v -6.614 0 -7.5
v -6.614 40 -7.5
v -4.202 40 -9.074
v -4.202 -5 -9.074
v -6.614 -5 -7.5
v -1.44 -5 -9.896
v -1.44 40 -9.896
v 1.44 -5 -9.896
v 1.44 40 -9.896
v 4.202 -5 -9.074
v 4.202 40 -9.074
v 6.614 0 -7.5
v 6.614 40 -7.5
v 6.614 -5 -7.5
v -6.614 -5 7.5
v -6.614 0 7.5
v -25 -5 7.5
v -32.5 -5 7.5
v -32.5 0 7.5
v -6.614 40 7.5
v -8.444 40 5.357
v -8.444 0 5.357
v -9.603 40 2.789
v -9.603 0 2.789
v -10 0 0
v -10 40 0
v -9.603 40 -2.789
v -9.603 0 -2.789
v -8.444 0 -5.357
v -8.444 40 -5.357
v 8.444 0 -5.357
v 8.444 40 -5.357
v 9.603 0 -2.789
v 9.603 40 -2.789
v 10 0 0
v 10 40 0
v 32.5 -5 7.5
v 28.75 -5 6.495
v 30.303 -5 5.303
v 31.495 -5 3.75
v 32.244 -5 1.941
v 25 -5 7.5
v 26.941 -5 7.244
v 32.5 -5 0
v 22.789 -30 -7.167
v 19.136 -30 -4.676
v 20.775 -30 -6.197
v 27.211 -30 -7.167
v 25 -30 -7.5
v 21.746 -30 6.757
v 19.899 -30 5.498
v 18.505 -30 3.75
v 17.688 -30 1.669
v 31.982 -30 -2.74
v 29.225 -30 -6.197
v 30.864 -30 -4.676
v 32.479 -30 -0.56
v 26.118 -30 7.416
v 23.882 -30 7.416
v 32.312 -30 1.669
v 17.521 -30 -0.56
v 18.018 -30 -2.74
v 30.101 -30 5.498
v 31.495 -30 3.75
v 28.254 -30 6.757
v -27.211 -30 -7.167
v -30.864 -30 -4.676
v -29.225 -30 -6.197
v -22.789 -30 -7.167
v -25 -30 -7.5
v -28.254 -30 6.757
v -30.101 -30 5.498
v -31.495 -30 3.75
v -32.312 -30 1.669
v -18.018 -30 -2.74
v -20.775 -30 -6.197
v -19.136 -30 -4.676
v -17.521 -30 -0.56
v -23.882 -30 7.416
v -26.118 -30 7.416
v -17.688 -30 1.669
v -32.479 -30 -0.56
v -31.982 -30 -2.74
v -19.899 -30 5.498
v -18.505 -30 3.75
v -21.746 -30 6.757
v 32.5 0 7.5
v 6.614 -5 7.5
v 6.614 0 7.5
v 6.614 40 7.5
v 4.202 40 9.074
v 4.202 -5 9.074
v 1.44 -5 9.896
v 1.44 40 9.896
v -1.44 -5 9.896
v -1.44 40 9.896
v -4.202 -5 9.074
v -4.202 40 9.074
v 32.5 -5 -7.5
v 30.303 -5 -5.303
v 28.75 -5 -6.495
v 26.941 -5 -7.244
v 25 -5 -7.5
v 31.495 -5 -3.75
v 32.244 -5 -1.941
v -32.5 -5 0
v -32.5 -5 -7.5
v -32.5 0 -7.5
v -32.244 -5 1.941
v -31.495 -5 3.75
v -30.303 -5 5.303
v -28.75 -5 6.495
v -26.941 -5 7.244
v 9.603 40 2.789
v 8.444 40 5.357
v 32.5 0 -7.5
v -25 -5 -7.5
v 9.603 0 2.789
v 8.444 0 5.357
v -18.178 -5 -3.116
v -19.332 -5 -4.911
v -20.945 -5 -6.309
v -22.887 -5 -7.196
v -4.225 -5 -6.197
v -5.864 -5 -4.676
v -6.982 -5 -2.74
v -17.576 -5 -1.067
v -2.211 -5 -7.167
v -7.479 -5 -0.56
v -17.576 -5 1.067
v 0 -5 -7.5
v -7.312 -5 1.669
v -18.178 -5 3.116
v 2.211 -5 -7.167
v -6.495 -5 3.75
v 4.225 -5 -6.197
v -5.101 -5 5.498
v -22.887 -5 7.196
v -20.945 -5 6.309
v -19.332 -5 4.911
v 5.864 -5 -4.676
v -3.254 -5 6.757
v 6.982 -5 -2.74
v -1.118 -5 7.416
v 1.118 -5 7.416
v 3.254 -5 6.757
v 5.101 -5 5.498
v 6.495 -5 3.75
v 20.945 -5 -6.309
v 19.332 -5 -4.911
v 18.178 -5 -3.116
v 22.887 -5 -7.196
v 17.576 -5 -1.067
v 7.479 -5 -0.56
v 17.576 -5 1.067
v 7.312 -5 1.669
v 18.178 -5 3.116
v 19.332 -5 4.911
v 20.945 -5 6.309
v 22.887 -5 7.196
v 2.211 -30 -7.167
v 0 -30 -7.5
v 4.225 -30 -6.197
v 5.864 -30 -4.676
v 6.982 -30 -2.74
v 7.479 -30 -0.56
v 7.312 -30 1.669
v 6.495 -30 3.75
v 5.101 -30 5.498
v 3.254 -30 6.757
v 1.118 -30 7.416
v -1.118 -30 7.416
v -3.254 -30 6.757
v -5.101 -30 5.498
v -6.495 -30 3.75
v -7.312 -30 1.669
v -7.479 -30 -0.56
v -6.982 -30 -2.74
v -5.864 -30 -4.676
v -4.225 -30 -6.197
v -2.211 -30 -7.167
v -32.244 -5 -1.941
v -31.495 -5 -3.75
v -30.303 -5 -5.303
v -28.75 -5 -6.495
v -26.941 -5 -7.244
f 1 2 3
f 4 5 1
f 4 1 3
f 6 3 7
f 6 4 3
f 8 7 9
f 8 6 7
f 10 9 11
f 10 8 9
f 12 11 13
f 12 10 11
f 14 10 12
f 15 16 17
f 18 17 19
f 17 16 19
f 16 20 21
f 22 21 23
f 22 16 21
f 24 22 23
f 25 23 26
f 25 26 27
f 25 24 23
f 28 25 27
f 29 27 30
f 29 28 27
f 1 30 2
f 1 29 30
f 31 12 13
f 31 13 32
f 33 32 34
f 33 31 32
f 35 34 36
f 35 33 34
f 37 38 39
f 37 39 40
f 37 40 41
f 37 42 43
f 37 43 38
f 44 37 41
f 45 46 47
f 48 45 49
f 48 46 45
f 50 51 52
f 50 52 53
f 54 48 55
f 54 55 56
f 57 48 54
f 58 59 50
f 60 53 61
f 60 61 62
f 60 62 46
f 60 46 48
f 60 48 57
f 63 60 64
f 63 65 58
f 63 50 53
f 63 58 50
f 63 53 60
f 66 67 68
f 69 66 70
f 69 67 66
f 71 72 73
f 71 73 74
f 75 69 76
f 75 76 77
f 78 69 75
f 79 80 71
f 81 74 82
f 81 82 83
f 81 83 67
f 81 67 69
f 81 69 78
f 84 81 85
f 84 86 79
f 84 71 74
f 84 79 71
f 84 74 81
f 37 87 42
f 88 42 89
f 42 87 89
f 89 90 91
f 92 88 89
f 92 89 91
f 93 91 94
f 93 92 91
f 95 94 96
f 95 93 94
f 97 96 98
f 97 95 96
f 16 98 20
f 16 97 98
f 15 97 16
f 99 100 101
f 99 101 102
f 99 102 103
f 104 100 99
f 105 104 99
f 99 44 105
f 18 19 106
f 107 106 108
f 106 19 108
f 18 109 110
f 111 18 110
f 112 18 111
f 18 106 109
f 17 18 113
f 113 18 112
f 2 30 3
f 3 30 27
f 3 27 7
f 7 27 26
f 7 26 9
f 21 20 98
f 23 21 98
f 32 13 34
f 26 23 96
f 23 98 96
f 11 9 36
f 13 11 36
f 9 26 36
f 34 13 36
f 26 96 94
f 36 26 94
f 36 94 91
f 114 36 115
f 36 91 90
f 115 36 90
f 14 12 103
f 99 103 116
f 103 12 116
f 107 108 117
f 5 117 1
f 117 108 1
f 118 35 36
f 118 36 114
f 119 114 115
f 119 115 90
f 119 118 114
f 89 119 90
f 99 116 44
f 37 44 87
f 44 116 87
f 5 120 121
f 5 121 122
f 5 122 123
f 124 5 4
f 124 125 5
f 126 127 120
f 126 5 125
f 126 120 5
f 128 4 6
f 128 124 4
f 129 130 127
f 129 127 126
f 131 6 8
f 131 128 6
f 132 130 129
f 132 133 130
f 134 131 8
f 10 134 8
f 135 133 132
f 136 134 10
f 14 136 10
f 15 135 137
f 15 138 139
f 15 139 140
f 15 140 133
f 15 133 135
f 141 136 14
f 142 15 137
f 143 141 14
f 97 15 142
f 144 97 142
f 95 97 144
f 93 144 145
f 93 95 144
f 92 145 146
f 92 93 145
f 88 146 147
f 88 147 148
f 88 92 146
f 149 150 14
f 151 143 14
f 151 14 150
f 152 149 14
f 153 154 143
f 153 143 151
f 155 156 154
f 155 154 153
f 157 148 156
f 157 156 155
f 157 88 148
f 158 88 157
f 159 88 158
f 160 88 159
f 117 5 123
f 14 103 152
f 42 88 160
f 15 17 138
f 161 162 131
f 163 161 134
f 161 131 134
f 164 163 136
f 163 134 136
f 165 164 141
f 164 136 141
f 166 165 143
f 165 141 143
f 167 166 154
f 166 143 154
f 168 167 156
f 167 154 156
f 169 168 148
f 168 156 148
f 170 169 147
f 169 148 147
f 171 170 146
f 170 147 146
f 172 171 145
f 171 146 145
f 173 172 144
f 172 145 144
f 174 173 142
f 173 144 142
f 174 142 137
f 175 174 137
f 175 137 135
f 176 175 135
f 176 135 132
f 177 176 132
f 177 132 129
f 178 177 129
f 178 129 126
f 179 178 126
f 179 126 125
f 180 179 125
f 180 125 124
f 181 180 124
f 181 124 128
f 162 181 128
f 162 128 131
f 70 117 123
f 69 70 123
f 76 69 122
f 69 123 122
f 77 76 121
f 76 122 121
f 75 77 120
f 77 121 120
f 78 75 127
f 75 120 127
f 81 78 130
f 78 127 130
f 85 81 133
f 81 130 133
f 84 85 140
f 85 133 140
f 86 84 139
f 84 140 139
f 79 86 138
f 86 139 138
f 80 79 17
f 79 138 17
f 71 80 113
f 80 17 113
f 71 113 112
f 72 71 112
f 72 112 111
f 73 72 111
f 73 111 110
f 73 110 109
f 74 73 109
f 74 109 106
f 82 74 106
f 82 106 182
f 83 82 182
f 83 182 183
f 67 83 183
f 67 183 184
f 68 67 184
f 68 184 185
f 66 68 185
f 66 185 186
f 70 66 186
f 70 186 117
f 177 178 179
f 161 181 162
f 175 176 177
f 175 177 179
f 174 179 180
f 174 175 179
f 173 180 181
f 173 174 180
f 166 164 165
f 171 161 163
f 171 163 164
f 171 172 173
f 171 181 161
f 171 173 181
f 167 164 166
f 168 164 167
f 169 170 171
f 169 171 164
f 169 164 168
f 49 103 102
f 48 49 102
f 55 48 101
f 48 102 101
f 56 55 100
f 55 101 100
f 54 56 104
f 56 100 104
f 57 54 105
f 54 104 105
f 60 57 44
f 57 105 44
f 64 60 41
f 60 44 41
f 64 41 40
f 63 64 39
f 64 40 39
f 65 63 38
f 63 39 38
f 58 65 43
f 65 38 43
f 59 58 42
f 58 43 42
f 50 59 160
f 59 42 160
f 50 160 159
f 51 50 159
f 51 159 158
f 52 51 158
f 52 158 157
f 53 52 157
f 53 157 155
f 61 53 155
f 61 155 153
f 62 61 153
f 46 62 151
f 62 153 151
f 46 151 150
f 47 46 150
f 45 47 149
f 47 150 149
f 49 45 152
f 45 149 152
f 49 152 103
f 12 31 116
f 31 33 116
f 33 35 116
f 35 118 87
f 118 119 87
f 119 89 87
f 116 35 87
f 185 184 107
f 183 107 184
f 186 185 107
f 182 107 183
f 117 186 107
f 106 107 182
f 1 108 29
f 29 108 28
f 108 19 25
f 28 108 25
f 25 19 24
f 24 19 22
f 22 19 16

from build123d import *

# Parameters (mm, degrees)
F1_DEPTH = 5
F2_DEPTH = 30
F3_DEPTH = 40


# Not quite as in the source:
# - after a boolean that leaves OpenCascade's solid faulty, fix() repairs it


with BuildPart() as f1:
    # F0 (on Front) → F1 (new body)
    with BuildSketch(Plane.XZ):
        with BuildLine():
            Line((-25, 7.5), (-32.5, 7.5))
            Line((-32.5, 7.5), (-32.5, 0))
            ThreePointArc((-32.5, 0), (-30.3033008589, 5.3033008589), (-25, 7.5))
        make_face()
        with BuildLine():
            Line((-6.6143782777, 7.5), (-25, 7.5))
            ThreePointArc((-25, 7.5), (-19.6966991411, 5.3033008589), (-17.5, 0))
            ThreePointArc((-17.5, 0), (-19.6966991411, -5.3033008589), (-25, -7.5))
            Line((-25, -7.5), (-6.6143782777, -7.5))
            ThreePointArc((-6.6143782777, -7.5), (-10, 0), (-6.6143782777, 7.5))
        make_face()
        with BuildLine():
            ThreePointArc((-17.5, 0), (-19.6966991411, 5.3033008589), (-25, 7.5))
            ThreePointArc((-25, 7.5), (-30.3033008589, 5.3033008589), (-32.5, 0))
            ThreePointArc((-32.5, 0), (-30.3033008589, -5.3033008589), (-25, -7.5))
            ThreePointArc((-25, -7.5), (-19.6966991411, -5.3033008589), (-17.5, 0))
        make_face()
        with BuildLine():
            ThreePointArc((-25, -7.5), (-30.3033008589, -5.3033008589), (-32.5, 0))
            Line((-32.5, 0), (-32.5, -7.5))
            Line((-32.5, -7.5), (-25, -7.5))
        make_face()
        with BuildLine():
            ThreePointArc((6.6143782777, 7.5), (0, 10), (-6.6143782777, 7.5))
            Line((-6.6143782777, 7.5), (0, 7.5))
            Line((0, 7.5), (6.6143782777, 7.5))
        make_face()
        with BuildLine():
            Line((0, 7.5), (-6.6143782777, 7.5))
            ThreePointArc((-6.6143782777, 7.5), (-10, 0), (-6.6143782777, -7.5))
            Line((-6.6143782777, -7.5), (-2.86e-08, -7.5))
            ThreePointArc((-2.86e-08, -7.5), (-7.5, 1.43e-08), (0, 7.5))
        make_face()
        with BuildLine():
            Line((6.6143782777, 7.5), (0, 7.5))
            ThreePointArc((0, 7.5), (5.3033008589, 5.3033008589), (7.5, 0))
            ThreePointArc((7.5, 0), (5.3033008488, -5.303300869), (-2.86e-08, -7.5))
            Line((-2.86e-08, -7.5), (6.6143782777, -7.5))
            ThreePointArc((6.6143782777, -7.5), (9.1143782777, -4.1143782777), (10, 0))
            ThreePointArc((10, 0), (9.1143782777, 4.1143782777), (6.6143782777, 7.5))
        make_face()
        with BuildLine():
            Line((25, 7.5), (6.6143782777, 7.5))
            ThreePointArc((6.6143782777, 7.5), (9.1143782777, 4.1143782777), (10, 0))
            ThreePointArc((10, 0), (9.1143782777, -4.1143782777), (6.6143782777, -7.5))
            Line((6.6143782777, -7.5), (25, -7.5))
            ThreePointArc((25, -7.5), (17.5, 0), (25, 7.5))
        make_face()
        with BuildLine():
            Line((-2.86e-08, -7.5), (-6.6143782777, -7.5))
            ThreePointArc((-6.6143782777, -7.5), (0, -10), (6.6143782777, -7.5))
            Line((6.6143782777, -7.5), (-2.86e-08, -7.5))
        make_face()
        with BuildLine():
            Line((32.5, 7.5), (25, 7.5))
            ThreePointArc((25, 7.5), (30.3033008589, 5.3033008589), (32.5, 0))
            Line((32.5, 0), (32.5, 7.5))
        make_face()
        with BuildLine():
            ThreePointArc((32.5, 0), (30.3033008589, 5.3033008589), (25, 7.5))
            ThreePointArc((25, 7.5), (17.5, 0), (25, -7.5))
            ThreePointArc((25, -7.5), (30.3033008589, -5.3033008589), (32.5, 0))
        make_face()
        with BuildLine():
            Line((32.5, -7.5), (32.5, 0))
            ThreePointArc((32.5, 0), (30.3033008589, -5.3033008589), (25, -7.5))
            Line((25, -7.5), (32.5, -7.5))
        make_face()
    extrude(amount=F1_DEPTH)

    # F0 (on Front) → F2 (join)
    with BuildSketch(Plane.XZ):
        with BuildLine():
            ThreePointArc((7.5, 0), (5.3033008589, 5.3033008589), (0, 7.5))
            ThreePointArc((0, 7.5), (-7.5, 1.43e-08), (-2.86e-08, -7.5))
            ThreePointArc((-2.86e-08, -7.5), (5.3033008488, -5.303300869), (7.5, 0))
        make_face()
        with BuildLine():
            ThreePointArc((32.5, 0), (30.3033008589, 5.3033008589), (25, 7.5))
            ThreePointArc((25, 7.5), (17.5, 0), (25, -7.5))
            ThreePointArc((25, -7.5), (30.3033008589, -5.3033008589), (32.5, 0))
        make_face()
        with BuildLine():
            ThreePointArc((-17.5, 0), (-19.6966991411, 5.3033008589), (-25, 7.5))
            ThreePointArc((-25, 7.5), (-30.3033008589, 5.3033008589), (-32.5, 0))
            ThreePointArc((-32.5, 0), (-30.3033008589, -5.3033008589), (-25, -7.5))
            ThreePointArc((-25, -7.5), (-19.6966991411, -5.3033008589), (-17.5, 0))
        make_face()
    extrude(amount=F2_DEPTH)

    # F0 (on Front) → F3 (join)
    with BuildSketch(Plane.XZ):
        with BuildLine():
            Line((0, 7.5), (-6.6143782777, 7.5))
            ThreePointArc((-6.6143782777, 7.5), (-10, 0), (-6.6143782777, -7.5))
            Line((-6.6143782777, -7.5), (-2.86e-08, -7.5))
            ThreePointArc((-2.86e-08, -7.5), (-7.5, 1.43e-08), (0, 7.5))
        make_face()
        with BuildLine():
            ThreePointArc((7.5, 0), (5.3033008589, 5.3033008589), (0, 7.5))
            ThreePointArc((0, 7.5), (-7.5, 1.43e-08), (-2.86e-08, -7.5))
            ThreePointArc((-2.86e-08, -7.5), (5.3033008488, -5.303300869), (7.5, 0))
        make_face()
        with BuildLine():
            Line((-2.86e-08, -7.5), (-6.6143782777, -7.5))
            ThreePointArc((-6.6143782777, -7.5), (0, -10), (6.6143782777, -7.5))
            Line((6.6143782777, -7.5), (-2.86e-08, -7.5))
        make_face()
        with BuildLine():
            Line((6.6143782777, 7.5), (0, 7.5))
            ThreePointArc((0, 7.5), (5.3033008589, 5.3033008589), (7.5, 0))
            ThreePointArc((7.5, 0), (5.3033008488, -5.303300869), (-2.86e-08, -7.5))
            Line((-2.86e-08, -7.5), (6.6143782777, -7.5))
            ThreePointArc((6.6143782777, -7.5), (9.1143782777, -4.1143782777), (10, 0))
            ThreePointArc((10, 0), (9.1143782777, 4.1143782777), (6.6143782777, 7.5))
        make_face()
        with BuildLine():
            ThreePointArc((6.6143782777, 7.5), (0, 10), (-6.6143782777, 7.5))
            Line((-6.6143782777, 7.5), (0, 7.5))
            Line((0, 7.5), (6.6143782777, 7.5))
        make_face()
    extrude(amount=-F3_DEPTH)

    add(f1.part.fix(), mode=Mode.REPLACE)


solid = f1.part
